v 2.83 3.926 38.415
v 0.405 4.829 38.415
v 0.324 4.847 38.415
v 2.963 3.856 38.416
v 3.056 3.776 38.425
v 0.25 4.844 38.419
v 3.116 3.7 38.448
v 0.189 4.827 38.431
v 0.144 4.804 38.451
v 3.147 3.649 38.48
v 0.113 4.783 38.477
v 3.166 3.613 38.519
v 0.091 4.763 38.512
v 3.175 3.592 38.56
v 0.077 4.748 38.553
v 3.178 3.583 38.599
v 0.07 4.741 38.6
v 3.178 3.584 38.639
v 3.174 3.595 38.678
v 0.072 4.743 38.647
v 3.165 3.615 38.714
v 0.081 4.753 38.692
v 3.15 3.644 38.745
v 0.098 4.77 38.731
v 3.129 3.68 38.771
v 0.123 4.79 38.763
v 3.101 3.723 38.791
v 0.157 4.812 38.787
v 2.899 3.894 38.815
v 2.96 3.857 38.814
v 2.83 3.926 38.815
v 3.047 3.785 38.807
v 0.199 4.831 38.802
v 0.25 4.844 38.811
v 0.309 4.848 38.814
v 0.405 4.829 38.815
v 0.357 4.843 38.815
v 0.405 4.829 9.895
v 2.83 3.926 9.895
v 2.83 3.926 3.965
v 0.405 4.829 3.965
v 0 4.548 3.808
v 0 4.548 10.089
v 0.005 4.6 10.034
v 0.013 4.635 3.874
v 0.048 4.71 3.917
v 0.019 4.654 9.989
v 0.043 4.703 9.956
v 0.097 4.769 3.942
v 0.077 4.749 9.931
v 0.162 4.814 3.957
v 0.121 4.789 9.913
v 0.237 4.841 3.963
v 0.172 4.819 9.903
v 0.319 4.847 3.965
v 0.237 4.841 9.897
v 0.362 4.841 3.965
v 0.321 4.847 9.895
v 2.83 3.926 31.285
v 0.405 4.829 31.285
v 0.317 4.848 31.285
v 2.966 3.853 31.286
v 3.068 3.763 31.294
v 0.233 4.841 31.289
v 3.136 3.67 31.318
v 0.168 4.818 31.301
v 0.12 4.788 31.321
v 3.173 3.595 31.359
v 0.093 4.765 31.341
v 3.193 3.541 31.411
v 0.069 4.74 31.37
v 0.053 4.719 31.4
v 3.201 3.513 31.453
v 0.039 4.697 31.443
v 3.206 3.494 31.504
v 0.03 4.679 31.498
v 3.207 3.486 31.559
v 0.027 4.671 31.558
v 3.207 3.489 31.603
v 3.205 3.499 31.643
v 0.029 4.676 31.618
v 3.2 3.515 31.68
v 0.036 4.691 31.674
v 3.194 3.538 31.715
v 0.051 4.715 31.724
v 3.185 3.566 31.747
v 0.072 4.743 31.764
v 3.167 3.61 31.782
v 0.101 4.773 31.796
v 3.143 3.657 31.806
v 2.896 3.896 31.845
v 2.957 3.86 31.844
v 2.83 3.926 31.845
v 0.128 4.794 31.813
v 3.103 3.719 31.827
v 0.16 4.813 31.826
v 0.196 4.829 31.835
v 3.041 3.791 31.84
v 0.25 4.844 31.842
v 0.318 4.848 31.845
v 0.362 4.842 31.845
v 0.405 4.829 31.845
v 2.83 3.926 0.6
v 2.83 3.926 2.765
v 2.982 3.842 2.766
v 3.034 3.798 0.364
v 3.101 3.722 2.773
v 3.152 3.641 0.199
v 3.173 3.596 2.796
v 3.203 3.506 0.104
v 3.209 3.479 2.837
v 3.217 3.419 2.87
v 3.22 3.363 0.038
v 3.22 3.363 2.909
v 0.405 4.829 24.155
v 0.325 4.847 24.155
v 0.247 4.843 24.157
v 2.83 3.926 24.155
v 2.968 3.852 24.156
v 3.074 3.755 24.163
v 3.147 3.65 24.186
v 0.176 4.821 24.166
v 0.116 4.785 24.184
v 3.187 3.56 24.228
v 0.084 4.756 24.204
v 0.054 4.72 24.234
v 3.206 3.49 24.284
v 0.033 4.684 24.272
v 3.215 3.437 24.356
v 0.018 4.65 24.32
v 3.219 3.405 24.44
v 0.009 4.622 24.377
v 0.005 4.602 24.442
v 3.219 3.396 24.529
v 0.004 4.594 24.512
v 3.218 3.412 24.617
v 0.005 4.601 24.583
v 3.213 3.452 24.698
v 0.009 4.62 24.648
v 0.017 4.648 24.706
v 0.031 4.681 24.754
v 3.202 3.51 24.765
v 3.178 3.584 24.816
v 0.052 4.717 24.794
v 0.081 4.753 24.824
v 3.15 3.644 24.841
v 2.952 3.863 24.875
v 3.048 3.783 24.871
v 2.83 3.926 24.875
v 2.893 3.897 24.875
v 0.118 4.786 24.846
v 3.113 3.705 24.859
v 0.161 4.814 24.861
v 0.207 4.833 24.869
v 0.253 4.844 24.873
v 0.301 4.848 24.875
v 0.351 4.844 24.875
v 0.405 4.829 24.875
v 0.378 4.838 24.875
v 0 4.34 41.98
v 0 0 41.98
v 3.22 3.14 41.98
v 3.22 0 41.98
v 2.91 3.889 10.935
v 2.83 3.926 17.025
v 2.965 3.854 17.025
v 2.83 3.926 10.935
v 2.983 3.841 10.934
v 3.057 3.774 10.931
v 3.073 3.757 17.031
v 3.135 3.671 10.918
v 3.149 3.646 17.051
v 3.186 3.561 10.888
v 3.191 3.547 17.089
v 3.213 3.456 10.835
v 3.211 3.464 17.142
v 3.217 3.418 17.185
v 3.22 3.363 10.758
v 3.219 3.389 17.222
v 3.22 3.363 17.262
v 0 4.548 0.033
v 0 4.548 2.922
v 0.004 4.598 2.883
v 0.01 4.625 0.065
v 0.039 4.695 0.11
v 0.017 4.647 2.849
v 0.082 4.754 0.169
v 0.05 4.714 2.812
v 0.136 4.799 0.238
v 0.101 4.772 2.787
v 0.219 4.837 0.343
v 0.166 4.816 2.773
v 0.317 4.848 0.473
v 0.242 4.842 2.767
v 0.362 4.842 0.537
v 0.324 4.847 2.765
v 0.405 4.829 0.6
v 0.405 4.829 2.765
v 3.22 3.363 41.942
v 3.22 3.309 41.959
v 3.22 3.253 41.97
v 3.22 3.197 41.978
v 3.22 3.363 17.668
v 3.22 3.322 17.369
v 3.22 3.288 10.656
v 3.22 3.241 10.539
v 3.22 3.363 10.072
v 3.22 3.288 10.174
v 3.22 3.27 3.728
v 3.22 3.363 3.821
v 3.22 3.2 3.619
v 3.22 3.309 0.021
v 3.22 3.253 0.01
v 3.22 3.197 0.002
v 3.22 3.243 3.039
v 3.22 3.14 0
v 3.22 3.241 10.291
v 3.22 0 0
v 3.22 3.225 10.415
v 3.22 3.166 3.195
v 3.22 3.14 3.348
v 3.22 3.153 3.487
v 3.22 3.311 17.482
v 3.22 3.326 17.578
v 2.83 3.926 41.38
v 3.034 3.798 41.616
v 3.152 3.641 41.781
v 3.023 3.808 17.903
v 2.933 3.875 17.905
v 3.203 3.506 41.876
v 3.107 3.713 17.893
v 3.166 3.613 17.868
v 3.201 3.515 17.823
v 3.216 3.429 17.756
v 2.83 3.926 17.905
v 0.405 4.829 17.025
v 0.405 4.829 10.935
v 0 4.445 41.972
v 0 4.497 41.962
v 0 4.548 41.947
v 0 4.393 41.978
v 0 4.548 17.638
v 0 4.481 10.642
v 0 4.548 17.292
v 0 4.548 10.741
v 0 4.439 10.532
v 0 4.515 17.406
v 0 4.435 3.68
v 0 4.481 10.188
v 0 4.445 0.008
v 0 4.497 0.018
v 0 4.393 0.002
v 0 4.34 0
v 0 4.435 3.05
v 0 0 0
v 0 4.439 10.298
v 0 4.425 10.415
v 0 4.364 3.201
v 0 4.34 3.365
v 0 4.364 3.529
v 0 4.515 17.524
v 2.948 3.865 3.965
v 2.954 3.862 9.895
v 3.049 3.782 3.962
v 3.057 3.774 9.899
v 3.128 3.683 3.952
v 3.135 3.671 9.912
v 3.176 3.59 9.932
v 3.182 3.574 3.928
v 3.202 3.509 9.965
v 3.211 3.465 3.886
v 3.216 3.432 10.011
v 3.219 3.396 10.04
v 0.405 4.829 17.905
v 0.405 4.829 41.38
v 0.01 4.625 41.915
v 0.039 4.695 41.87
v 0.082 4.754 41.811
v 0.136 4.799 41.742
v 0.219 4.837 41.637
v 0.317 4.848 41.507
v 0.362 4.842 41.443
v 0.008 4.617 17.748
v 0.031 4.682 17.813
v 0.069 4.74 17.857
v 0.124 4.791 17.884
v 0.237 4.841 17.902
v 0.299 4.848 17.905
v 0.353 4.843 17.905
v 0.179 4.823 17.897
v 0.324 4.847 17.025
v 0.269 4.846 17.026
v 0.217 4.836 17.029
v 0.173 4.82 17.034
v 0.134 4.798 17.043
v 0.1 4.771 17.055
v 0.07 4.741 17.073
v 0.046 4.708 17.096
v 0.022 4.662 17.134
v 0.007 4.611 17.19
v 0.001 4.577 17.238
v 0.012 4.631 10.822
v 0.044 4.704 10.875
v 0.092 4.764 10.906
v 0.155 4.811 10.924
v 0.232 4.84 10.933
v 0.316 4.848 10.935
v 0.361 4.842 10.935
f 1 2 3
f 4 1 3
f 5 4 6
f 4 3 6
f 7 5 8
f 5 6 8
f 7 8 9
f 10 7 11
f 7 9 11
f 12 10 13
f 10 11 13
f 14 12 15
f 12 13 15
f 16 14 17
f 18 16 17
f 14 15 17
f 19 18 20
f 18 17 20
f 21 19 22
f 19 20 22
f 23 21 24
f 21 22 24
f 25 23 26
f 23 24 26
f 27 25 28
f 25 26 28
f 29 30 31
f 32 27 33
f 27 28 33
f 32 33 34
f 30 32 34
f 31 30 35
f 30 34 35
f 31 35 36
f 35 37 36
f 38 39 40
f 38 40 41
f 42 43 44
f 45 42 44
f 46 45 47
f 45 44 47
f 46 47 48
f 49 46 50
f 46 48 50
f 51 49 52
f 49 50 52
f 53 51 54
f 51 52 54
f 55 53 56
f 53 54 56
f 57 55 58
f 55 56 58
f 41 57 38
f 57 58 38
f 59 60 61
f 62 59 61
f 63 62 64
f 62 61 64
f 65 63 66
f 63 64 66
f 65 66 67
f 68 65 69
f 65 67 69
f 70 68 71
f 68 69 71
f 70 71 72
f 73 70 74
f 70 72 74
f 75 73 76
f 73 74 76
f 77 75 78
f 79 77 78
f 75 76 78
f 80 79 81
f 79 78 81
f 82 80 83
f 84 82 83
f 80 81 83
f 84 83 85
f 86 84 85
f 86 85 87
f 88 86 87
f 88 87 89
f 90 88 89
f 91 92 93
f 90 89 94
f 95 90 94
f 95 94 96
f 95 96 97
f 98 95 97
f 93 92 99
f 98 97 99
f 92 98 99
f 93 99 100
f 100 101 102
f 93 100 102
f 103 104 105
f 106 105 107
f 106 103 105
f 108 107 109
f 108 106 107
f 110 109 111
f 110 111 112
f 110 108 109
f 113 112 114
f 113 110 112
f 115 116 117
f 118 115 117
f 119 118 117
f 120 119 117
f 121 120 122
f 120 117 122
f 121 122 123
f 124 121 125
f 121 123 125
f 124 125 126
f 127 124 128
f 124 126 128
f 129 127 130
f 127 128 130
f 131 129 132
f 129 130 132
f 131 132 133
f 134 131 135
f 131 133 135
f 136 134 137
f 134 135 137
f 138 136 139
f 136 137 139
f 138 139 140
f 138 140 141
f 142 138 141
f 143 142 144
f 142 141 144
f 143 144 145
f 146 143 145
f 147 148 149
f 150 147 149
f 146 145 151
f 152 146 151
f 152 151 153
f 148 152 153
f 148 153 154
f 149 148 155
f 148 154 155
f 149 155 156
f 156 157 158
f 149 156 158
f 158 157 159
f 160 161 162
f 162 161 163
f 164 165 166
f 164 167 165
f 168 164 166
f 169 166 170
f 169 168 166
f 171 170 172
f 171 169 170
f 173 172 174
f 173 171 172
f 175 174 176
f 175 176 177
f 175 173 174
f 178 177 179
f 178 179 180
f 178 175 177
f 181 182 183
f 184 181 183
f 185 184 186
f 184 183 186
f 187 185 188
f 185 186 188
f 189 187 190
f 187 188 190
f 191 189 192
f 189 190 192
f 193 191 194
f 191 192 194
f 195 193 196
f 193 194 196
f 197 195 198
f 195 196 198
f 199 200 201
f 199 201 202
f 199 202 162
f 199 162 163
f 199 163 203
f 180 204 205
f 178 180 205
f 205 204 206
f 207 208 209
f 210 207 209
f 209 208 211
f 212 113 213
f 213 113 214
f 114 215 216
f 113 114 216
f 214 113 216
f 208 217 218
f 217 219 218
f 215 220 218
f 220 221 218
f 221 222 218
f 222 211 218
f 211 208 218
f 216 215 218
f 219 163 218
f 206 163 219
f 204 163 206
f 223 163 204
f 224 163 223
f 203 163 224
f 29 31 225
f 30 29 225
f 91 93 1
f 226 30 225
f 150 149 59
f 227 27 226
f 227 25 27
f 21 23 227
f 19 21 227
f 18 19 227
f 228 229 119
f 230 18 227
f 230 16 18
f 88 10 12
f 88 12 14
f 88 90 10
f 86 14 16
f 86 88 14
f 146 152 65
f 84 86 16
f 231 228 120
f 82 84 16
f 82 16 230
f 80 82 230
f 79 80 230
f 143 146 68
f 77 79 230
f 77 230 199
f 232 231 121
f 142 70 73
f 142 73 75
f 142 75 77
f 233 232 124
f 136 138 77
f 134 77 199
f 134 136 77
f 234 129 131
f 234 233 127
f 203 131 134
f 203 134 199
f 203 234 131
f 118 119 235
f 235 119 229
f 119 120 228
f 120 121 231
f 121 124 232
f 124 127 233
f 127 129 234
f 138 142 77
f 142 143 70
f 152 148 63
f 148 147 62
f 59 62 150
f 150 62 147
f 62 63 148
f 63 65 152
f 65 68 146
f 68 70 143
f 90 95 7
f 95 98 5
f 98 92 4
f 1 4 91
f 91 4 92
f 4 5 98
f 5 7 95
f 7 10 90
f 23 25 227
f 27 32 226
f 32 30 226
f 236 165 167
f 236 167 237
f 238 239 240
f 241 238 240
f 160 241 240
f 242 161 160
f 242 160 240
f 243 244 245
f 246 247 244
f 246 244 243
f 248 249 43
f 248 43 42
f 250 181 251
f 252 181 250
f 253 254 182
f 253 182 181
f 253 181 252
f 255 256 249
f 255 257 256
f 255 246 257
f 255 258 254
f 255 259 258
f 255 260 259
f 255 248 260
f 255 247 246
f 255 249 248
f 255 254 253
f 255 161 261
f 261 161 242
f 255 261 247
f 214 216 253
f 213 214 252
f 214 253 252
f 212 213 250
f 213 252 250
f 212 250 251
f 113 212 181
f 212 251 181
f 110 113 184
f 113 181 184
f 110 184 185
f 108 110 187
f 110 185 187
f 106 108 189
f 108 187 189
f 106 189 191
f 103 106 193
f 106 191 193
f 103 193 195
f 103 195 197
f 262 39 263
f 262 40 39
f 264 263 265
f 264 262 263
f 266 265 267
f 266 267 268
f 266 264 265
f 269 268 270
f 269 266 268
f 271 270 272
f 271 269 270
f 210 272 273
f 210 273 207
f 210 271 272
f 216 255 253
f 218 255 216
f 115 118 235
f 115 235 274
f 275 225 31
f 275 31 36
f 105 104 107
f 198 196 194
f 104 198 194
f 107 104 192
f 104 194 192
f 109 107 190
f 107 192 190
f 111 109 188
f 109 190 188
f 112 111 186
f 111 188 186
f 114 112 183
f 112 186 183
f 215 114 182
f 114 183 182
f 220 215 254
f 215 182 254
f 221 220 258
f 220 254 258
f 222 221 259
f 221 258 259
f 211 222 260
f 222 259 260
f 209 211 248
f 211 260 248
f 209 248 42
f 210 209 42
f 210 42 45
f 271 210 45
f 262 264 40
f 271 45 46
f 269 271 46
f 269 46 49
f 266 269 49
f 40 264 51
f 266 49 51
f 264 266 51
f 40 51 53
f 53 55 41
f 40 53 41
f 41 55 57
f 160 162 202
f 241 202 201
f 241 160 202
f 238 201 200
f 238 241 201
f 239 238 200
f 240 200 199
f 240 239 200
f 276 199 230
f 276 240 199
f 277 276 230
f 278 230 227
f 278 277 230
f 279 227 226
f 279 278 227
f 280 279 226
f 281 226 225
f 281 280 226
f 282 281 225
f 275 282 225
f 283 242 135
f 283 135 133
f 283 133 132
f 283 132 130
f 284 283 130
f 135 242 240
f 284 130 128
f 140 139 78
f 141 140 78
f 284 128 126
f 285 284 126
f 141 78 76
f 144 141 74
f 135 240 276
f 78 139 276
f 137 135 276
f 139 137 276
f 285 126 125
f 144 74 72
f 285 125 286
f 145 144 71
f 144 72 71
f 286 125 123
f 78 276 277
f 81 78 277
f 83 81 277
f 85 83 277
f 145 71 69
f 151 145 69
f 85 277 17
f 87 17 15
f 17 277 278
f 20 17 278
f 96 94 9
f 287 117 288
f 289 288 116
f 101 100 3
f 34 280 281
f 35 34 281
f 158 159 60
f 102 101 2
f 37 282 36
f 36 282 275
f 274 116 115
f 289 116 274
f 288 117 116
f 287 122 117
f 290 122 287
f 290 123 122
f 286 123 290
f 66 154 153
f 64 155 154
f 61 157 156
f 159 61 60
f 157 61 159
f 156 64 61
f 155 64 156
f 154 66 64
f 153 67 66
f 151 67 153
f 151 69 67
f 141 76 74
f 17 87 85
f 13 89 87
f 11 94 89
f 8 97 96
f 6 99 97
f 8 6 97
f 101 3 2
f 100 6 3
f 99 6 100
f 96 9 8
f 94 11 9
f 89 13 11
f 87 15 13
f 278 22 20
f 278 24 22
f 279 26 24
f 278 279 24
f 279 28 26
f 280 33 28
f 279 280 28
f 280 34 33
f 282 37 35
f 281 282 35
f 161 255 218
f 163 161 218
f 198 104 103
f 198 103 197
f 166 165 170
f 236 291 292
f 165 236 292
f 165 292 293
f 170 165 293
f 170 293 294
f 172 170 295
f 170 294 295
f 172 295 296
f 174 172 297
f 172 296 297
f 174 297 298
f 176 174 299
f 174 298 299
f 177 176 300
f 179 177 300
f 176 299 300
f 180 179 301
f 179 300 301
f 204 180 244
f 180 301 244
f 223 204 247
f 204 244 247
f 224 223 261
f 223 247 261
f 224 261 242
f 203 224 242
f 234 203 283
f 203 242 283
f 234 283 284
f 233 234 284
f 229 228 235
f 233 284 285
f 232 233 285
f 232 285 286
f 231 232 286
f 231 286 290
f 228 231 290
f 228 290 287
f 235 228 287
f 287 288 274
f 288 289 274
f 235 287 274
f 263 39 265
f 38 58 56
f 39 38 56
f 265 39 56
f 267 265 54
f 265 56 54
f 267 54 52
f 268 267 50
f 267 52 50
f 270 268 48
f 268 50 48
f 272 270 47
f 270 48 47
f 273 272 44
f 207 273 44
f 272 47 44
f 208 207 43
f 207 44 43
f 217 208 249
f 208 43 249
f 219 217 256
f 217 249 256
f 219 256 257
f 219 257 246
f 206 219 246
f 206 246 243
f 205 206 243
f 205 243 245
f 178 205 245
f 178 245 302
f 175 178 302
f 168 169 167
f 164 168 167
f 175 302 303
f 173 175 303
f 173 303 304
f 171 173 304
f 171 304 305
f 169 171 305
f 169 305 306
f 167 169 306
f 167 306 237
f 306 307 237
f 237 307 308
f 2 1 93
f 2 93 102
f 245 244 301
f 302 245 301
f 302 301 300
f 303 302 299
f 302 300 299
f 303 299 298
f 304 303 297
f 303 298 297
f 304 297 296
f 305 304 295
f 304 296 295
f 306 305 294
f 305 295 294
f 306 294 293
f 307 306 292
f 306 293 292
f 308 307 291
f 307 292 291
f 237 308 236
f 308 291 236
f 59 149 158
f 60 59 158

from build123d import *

# Parameters (mm, degrees)
SKETCH1_W           = 3.22
SKETCH1_H           = 41.98
BOSS_EXTRUDE1_DEPTH = 4.98
CUT_EXTRUDE1_DEPTH  = 41.98
FILLET1_R           = 0.6
FILLET2_R           = 0.3
SKETCH4_R           = 0.6
SKETCH4_R_2         = 0.2
SKETCH4_R_3         = 0.28
SKETCH4_R_4         = 0.36
SKETCH4_R_5         = 0.44
SKETCH4_R_6         = 0.52
CUT_EXTRUDE2_DEPTH  = 4.98


with BuildPart() as part:
    # Sketch1 → Boss-Extrude1 (new body)
    with BuildSketch(Plane(origin=(0, 0, 0), x_dir=(1, 0, 0), z_dir=(0, 1, 0))):
        with Locations((1.61, -20.99)):
            Rectangle(SKETCH1_W, SKETCH1_H)
    extrude(amount=BOSS_EXTRUDE1_DEPTH)

    # Sketch2 → Cut-Extrude1 (cut)
    with BuildSketch(Plane.XY.offset(41.98)):
        Polygon((0, 4.98), (3.22, 4.98), (3.22, 3.78), align=None)
    extrude(amount=-CUT_EXTRUDE1_DEPTH, mode=Mode.SUBTRACT)

    # Fillet1
    fillet1_edges = [part.edges().sort_by_distance(p)[0] for p in [
        (3.22, 3.78, 20.99),
        (1.61, 4.38, 41.98),
        (1.61, 4.38, 0),
    ]]
    fillet(fillet1_edges, radius=FILLET1_R)

    # Fillet2
    # the kernel refuses this fillet: 0.3 mm, written as the material it takes off along each edge
    with BuildSketch(Plane(origin=(0, 4.98, 42.459891752), x_dir=(0, -1, 0), z_dir=(0, 0, -1))) as fillet2_piece_1:
        with BuildLine():
            CenterArc((FILLET2_R * 1.43985566994, -FILLET2_R), FILLET2_R, 90, 110.438955915)
            Line((FILLET2_R * 0.50281089434, -FILLET2_R * 1.34920923314), (0, 0))
            Line((0, 0), (FILLET2_R * 1.43985566994, 0))
        make_face()
    extrude(amount=42.939783505, mode=Mode.SUBTRACT)

    # Sketch4 → Cut-Extrude2 (cut)
    with BuildSketch(Plane(origin=(-1.629578944, 0.607296501, 0), x_dir=(0, 0, 1), z_dir=(-0.9370447756039936, 0.3492092331443447, 0))):
        with Locations((3.365, 4.666482983)):
            Circle(SKETCH4_R)
        with Locations((38.615, 4.666482983)):
            Circle(SKETCH4_R_2)
        with Locations((31.565, 4.666482983)):
            Circle(SKETCH4_R_3)
        with Locations((24.515, 4.666482983)):
            Circle(SKETCH4_R_4)
        with Locations((17.465, 4.666482983)):
            Circle(SKETCH4_R_5)
        with Locations((10.415, 4.666482983)):
            Circle(SKETCH4_R_6)
    extrude(amount=-CUT_EXTRUDE2_DEPTH, mode=Mode.SUBTRACT)


solid = part.part
